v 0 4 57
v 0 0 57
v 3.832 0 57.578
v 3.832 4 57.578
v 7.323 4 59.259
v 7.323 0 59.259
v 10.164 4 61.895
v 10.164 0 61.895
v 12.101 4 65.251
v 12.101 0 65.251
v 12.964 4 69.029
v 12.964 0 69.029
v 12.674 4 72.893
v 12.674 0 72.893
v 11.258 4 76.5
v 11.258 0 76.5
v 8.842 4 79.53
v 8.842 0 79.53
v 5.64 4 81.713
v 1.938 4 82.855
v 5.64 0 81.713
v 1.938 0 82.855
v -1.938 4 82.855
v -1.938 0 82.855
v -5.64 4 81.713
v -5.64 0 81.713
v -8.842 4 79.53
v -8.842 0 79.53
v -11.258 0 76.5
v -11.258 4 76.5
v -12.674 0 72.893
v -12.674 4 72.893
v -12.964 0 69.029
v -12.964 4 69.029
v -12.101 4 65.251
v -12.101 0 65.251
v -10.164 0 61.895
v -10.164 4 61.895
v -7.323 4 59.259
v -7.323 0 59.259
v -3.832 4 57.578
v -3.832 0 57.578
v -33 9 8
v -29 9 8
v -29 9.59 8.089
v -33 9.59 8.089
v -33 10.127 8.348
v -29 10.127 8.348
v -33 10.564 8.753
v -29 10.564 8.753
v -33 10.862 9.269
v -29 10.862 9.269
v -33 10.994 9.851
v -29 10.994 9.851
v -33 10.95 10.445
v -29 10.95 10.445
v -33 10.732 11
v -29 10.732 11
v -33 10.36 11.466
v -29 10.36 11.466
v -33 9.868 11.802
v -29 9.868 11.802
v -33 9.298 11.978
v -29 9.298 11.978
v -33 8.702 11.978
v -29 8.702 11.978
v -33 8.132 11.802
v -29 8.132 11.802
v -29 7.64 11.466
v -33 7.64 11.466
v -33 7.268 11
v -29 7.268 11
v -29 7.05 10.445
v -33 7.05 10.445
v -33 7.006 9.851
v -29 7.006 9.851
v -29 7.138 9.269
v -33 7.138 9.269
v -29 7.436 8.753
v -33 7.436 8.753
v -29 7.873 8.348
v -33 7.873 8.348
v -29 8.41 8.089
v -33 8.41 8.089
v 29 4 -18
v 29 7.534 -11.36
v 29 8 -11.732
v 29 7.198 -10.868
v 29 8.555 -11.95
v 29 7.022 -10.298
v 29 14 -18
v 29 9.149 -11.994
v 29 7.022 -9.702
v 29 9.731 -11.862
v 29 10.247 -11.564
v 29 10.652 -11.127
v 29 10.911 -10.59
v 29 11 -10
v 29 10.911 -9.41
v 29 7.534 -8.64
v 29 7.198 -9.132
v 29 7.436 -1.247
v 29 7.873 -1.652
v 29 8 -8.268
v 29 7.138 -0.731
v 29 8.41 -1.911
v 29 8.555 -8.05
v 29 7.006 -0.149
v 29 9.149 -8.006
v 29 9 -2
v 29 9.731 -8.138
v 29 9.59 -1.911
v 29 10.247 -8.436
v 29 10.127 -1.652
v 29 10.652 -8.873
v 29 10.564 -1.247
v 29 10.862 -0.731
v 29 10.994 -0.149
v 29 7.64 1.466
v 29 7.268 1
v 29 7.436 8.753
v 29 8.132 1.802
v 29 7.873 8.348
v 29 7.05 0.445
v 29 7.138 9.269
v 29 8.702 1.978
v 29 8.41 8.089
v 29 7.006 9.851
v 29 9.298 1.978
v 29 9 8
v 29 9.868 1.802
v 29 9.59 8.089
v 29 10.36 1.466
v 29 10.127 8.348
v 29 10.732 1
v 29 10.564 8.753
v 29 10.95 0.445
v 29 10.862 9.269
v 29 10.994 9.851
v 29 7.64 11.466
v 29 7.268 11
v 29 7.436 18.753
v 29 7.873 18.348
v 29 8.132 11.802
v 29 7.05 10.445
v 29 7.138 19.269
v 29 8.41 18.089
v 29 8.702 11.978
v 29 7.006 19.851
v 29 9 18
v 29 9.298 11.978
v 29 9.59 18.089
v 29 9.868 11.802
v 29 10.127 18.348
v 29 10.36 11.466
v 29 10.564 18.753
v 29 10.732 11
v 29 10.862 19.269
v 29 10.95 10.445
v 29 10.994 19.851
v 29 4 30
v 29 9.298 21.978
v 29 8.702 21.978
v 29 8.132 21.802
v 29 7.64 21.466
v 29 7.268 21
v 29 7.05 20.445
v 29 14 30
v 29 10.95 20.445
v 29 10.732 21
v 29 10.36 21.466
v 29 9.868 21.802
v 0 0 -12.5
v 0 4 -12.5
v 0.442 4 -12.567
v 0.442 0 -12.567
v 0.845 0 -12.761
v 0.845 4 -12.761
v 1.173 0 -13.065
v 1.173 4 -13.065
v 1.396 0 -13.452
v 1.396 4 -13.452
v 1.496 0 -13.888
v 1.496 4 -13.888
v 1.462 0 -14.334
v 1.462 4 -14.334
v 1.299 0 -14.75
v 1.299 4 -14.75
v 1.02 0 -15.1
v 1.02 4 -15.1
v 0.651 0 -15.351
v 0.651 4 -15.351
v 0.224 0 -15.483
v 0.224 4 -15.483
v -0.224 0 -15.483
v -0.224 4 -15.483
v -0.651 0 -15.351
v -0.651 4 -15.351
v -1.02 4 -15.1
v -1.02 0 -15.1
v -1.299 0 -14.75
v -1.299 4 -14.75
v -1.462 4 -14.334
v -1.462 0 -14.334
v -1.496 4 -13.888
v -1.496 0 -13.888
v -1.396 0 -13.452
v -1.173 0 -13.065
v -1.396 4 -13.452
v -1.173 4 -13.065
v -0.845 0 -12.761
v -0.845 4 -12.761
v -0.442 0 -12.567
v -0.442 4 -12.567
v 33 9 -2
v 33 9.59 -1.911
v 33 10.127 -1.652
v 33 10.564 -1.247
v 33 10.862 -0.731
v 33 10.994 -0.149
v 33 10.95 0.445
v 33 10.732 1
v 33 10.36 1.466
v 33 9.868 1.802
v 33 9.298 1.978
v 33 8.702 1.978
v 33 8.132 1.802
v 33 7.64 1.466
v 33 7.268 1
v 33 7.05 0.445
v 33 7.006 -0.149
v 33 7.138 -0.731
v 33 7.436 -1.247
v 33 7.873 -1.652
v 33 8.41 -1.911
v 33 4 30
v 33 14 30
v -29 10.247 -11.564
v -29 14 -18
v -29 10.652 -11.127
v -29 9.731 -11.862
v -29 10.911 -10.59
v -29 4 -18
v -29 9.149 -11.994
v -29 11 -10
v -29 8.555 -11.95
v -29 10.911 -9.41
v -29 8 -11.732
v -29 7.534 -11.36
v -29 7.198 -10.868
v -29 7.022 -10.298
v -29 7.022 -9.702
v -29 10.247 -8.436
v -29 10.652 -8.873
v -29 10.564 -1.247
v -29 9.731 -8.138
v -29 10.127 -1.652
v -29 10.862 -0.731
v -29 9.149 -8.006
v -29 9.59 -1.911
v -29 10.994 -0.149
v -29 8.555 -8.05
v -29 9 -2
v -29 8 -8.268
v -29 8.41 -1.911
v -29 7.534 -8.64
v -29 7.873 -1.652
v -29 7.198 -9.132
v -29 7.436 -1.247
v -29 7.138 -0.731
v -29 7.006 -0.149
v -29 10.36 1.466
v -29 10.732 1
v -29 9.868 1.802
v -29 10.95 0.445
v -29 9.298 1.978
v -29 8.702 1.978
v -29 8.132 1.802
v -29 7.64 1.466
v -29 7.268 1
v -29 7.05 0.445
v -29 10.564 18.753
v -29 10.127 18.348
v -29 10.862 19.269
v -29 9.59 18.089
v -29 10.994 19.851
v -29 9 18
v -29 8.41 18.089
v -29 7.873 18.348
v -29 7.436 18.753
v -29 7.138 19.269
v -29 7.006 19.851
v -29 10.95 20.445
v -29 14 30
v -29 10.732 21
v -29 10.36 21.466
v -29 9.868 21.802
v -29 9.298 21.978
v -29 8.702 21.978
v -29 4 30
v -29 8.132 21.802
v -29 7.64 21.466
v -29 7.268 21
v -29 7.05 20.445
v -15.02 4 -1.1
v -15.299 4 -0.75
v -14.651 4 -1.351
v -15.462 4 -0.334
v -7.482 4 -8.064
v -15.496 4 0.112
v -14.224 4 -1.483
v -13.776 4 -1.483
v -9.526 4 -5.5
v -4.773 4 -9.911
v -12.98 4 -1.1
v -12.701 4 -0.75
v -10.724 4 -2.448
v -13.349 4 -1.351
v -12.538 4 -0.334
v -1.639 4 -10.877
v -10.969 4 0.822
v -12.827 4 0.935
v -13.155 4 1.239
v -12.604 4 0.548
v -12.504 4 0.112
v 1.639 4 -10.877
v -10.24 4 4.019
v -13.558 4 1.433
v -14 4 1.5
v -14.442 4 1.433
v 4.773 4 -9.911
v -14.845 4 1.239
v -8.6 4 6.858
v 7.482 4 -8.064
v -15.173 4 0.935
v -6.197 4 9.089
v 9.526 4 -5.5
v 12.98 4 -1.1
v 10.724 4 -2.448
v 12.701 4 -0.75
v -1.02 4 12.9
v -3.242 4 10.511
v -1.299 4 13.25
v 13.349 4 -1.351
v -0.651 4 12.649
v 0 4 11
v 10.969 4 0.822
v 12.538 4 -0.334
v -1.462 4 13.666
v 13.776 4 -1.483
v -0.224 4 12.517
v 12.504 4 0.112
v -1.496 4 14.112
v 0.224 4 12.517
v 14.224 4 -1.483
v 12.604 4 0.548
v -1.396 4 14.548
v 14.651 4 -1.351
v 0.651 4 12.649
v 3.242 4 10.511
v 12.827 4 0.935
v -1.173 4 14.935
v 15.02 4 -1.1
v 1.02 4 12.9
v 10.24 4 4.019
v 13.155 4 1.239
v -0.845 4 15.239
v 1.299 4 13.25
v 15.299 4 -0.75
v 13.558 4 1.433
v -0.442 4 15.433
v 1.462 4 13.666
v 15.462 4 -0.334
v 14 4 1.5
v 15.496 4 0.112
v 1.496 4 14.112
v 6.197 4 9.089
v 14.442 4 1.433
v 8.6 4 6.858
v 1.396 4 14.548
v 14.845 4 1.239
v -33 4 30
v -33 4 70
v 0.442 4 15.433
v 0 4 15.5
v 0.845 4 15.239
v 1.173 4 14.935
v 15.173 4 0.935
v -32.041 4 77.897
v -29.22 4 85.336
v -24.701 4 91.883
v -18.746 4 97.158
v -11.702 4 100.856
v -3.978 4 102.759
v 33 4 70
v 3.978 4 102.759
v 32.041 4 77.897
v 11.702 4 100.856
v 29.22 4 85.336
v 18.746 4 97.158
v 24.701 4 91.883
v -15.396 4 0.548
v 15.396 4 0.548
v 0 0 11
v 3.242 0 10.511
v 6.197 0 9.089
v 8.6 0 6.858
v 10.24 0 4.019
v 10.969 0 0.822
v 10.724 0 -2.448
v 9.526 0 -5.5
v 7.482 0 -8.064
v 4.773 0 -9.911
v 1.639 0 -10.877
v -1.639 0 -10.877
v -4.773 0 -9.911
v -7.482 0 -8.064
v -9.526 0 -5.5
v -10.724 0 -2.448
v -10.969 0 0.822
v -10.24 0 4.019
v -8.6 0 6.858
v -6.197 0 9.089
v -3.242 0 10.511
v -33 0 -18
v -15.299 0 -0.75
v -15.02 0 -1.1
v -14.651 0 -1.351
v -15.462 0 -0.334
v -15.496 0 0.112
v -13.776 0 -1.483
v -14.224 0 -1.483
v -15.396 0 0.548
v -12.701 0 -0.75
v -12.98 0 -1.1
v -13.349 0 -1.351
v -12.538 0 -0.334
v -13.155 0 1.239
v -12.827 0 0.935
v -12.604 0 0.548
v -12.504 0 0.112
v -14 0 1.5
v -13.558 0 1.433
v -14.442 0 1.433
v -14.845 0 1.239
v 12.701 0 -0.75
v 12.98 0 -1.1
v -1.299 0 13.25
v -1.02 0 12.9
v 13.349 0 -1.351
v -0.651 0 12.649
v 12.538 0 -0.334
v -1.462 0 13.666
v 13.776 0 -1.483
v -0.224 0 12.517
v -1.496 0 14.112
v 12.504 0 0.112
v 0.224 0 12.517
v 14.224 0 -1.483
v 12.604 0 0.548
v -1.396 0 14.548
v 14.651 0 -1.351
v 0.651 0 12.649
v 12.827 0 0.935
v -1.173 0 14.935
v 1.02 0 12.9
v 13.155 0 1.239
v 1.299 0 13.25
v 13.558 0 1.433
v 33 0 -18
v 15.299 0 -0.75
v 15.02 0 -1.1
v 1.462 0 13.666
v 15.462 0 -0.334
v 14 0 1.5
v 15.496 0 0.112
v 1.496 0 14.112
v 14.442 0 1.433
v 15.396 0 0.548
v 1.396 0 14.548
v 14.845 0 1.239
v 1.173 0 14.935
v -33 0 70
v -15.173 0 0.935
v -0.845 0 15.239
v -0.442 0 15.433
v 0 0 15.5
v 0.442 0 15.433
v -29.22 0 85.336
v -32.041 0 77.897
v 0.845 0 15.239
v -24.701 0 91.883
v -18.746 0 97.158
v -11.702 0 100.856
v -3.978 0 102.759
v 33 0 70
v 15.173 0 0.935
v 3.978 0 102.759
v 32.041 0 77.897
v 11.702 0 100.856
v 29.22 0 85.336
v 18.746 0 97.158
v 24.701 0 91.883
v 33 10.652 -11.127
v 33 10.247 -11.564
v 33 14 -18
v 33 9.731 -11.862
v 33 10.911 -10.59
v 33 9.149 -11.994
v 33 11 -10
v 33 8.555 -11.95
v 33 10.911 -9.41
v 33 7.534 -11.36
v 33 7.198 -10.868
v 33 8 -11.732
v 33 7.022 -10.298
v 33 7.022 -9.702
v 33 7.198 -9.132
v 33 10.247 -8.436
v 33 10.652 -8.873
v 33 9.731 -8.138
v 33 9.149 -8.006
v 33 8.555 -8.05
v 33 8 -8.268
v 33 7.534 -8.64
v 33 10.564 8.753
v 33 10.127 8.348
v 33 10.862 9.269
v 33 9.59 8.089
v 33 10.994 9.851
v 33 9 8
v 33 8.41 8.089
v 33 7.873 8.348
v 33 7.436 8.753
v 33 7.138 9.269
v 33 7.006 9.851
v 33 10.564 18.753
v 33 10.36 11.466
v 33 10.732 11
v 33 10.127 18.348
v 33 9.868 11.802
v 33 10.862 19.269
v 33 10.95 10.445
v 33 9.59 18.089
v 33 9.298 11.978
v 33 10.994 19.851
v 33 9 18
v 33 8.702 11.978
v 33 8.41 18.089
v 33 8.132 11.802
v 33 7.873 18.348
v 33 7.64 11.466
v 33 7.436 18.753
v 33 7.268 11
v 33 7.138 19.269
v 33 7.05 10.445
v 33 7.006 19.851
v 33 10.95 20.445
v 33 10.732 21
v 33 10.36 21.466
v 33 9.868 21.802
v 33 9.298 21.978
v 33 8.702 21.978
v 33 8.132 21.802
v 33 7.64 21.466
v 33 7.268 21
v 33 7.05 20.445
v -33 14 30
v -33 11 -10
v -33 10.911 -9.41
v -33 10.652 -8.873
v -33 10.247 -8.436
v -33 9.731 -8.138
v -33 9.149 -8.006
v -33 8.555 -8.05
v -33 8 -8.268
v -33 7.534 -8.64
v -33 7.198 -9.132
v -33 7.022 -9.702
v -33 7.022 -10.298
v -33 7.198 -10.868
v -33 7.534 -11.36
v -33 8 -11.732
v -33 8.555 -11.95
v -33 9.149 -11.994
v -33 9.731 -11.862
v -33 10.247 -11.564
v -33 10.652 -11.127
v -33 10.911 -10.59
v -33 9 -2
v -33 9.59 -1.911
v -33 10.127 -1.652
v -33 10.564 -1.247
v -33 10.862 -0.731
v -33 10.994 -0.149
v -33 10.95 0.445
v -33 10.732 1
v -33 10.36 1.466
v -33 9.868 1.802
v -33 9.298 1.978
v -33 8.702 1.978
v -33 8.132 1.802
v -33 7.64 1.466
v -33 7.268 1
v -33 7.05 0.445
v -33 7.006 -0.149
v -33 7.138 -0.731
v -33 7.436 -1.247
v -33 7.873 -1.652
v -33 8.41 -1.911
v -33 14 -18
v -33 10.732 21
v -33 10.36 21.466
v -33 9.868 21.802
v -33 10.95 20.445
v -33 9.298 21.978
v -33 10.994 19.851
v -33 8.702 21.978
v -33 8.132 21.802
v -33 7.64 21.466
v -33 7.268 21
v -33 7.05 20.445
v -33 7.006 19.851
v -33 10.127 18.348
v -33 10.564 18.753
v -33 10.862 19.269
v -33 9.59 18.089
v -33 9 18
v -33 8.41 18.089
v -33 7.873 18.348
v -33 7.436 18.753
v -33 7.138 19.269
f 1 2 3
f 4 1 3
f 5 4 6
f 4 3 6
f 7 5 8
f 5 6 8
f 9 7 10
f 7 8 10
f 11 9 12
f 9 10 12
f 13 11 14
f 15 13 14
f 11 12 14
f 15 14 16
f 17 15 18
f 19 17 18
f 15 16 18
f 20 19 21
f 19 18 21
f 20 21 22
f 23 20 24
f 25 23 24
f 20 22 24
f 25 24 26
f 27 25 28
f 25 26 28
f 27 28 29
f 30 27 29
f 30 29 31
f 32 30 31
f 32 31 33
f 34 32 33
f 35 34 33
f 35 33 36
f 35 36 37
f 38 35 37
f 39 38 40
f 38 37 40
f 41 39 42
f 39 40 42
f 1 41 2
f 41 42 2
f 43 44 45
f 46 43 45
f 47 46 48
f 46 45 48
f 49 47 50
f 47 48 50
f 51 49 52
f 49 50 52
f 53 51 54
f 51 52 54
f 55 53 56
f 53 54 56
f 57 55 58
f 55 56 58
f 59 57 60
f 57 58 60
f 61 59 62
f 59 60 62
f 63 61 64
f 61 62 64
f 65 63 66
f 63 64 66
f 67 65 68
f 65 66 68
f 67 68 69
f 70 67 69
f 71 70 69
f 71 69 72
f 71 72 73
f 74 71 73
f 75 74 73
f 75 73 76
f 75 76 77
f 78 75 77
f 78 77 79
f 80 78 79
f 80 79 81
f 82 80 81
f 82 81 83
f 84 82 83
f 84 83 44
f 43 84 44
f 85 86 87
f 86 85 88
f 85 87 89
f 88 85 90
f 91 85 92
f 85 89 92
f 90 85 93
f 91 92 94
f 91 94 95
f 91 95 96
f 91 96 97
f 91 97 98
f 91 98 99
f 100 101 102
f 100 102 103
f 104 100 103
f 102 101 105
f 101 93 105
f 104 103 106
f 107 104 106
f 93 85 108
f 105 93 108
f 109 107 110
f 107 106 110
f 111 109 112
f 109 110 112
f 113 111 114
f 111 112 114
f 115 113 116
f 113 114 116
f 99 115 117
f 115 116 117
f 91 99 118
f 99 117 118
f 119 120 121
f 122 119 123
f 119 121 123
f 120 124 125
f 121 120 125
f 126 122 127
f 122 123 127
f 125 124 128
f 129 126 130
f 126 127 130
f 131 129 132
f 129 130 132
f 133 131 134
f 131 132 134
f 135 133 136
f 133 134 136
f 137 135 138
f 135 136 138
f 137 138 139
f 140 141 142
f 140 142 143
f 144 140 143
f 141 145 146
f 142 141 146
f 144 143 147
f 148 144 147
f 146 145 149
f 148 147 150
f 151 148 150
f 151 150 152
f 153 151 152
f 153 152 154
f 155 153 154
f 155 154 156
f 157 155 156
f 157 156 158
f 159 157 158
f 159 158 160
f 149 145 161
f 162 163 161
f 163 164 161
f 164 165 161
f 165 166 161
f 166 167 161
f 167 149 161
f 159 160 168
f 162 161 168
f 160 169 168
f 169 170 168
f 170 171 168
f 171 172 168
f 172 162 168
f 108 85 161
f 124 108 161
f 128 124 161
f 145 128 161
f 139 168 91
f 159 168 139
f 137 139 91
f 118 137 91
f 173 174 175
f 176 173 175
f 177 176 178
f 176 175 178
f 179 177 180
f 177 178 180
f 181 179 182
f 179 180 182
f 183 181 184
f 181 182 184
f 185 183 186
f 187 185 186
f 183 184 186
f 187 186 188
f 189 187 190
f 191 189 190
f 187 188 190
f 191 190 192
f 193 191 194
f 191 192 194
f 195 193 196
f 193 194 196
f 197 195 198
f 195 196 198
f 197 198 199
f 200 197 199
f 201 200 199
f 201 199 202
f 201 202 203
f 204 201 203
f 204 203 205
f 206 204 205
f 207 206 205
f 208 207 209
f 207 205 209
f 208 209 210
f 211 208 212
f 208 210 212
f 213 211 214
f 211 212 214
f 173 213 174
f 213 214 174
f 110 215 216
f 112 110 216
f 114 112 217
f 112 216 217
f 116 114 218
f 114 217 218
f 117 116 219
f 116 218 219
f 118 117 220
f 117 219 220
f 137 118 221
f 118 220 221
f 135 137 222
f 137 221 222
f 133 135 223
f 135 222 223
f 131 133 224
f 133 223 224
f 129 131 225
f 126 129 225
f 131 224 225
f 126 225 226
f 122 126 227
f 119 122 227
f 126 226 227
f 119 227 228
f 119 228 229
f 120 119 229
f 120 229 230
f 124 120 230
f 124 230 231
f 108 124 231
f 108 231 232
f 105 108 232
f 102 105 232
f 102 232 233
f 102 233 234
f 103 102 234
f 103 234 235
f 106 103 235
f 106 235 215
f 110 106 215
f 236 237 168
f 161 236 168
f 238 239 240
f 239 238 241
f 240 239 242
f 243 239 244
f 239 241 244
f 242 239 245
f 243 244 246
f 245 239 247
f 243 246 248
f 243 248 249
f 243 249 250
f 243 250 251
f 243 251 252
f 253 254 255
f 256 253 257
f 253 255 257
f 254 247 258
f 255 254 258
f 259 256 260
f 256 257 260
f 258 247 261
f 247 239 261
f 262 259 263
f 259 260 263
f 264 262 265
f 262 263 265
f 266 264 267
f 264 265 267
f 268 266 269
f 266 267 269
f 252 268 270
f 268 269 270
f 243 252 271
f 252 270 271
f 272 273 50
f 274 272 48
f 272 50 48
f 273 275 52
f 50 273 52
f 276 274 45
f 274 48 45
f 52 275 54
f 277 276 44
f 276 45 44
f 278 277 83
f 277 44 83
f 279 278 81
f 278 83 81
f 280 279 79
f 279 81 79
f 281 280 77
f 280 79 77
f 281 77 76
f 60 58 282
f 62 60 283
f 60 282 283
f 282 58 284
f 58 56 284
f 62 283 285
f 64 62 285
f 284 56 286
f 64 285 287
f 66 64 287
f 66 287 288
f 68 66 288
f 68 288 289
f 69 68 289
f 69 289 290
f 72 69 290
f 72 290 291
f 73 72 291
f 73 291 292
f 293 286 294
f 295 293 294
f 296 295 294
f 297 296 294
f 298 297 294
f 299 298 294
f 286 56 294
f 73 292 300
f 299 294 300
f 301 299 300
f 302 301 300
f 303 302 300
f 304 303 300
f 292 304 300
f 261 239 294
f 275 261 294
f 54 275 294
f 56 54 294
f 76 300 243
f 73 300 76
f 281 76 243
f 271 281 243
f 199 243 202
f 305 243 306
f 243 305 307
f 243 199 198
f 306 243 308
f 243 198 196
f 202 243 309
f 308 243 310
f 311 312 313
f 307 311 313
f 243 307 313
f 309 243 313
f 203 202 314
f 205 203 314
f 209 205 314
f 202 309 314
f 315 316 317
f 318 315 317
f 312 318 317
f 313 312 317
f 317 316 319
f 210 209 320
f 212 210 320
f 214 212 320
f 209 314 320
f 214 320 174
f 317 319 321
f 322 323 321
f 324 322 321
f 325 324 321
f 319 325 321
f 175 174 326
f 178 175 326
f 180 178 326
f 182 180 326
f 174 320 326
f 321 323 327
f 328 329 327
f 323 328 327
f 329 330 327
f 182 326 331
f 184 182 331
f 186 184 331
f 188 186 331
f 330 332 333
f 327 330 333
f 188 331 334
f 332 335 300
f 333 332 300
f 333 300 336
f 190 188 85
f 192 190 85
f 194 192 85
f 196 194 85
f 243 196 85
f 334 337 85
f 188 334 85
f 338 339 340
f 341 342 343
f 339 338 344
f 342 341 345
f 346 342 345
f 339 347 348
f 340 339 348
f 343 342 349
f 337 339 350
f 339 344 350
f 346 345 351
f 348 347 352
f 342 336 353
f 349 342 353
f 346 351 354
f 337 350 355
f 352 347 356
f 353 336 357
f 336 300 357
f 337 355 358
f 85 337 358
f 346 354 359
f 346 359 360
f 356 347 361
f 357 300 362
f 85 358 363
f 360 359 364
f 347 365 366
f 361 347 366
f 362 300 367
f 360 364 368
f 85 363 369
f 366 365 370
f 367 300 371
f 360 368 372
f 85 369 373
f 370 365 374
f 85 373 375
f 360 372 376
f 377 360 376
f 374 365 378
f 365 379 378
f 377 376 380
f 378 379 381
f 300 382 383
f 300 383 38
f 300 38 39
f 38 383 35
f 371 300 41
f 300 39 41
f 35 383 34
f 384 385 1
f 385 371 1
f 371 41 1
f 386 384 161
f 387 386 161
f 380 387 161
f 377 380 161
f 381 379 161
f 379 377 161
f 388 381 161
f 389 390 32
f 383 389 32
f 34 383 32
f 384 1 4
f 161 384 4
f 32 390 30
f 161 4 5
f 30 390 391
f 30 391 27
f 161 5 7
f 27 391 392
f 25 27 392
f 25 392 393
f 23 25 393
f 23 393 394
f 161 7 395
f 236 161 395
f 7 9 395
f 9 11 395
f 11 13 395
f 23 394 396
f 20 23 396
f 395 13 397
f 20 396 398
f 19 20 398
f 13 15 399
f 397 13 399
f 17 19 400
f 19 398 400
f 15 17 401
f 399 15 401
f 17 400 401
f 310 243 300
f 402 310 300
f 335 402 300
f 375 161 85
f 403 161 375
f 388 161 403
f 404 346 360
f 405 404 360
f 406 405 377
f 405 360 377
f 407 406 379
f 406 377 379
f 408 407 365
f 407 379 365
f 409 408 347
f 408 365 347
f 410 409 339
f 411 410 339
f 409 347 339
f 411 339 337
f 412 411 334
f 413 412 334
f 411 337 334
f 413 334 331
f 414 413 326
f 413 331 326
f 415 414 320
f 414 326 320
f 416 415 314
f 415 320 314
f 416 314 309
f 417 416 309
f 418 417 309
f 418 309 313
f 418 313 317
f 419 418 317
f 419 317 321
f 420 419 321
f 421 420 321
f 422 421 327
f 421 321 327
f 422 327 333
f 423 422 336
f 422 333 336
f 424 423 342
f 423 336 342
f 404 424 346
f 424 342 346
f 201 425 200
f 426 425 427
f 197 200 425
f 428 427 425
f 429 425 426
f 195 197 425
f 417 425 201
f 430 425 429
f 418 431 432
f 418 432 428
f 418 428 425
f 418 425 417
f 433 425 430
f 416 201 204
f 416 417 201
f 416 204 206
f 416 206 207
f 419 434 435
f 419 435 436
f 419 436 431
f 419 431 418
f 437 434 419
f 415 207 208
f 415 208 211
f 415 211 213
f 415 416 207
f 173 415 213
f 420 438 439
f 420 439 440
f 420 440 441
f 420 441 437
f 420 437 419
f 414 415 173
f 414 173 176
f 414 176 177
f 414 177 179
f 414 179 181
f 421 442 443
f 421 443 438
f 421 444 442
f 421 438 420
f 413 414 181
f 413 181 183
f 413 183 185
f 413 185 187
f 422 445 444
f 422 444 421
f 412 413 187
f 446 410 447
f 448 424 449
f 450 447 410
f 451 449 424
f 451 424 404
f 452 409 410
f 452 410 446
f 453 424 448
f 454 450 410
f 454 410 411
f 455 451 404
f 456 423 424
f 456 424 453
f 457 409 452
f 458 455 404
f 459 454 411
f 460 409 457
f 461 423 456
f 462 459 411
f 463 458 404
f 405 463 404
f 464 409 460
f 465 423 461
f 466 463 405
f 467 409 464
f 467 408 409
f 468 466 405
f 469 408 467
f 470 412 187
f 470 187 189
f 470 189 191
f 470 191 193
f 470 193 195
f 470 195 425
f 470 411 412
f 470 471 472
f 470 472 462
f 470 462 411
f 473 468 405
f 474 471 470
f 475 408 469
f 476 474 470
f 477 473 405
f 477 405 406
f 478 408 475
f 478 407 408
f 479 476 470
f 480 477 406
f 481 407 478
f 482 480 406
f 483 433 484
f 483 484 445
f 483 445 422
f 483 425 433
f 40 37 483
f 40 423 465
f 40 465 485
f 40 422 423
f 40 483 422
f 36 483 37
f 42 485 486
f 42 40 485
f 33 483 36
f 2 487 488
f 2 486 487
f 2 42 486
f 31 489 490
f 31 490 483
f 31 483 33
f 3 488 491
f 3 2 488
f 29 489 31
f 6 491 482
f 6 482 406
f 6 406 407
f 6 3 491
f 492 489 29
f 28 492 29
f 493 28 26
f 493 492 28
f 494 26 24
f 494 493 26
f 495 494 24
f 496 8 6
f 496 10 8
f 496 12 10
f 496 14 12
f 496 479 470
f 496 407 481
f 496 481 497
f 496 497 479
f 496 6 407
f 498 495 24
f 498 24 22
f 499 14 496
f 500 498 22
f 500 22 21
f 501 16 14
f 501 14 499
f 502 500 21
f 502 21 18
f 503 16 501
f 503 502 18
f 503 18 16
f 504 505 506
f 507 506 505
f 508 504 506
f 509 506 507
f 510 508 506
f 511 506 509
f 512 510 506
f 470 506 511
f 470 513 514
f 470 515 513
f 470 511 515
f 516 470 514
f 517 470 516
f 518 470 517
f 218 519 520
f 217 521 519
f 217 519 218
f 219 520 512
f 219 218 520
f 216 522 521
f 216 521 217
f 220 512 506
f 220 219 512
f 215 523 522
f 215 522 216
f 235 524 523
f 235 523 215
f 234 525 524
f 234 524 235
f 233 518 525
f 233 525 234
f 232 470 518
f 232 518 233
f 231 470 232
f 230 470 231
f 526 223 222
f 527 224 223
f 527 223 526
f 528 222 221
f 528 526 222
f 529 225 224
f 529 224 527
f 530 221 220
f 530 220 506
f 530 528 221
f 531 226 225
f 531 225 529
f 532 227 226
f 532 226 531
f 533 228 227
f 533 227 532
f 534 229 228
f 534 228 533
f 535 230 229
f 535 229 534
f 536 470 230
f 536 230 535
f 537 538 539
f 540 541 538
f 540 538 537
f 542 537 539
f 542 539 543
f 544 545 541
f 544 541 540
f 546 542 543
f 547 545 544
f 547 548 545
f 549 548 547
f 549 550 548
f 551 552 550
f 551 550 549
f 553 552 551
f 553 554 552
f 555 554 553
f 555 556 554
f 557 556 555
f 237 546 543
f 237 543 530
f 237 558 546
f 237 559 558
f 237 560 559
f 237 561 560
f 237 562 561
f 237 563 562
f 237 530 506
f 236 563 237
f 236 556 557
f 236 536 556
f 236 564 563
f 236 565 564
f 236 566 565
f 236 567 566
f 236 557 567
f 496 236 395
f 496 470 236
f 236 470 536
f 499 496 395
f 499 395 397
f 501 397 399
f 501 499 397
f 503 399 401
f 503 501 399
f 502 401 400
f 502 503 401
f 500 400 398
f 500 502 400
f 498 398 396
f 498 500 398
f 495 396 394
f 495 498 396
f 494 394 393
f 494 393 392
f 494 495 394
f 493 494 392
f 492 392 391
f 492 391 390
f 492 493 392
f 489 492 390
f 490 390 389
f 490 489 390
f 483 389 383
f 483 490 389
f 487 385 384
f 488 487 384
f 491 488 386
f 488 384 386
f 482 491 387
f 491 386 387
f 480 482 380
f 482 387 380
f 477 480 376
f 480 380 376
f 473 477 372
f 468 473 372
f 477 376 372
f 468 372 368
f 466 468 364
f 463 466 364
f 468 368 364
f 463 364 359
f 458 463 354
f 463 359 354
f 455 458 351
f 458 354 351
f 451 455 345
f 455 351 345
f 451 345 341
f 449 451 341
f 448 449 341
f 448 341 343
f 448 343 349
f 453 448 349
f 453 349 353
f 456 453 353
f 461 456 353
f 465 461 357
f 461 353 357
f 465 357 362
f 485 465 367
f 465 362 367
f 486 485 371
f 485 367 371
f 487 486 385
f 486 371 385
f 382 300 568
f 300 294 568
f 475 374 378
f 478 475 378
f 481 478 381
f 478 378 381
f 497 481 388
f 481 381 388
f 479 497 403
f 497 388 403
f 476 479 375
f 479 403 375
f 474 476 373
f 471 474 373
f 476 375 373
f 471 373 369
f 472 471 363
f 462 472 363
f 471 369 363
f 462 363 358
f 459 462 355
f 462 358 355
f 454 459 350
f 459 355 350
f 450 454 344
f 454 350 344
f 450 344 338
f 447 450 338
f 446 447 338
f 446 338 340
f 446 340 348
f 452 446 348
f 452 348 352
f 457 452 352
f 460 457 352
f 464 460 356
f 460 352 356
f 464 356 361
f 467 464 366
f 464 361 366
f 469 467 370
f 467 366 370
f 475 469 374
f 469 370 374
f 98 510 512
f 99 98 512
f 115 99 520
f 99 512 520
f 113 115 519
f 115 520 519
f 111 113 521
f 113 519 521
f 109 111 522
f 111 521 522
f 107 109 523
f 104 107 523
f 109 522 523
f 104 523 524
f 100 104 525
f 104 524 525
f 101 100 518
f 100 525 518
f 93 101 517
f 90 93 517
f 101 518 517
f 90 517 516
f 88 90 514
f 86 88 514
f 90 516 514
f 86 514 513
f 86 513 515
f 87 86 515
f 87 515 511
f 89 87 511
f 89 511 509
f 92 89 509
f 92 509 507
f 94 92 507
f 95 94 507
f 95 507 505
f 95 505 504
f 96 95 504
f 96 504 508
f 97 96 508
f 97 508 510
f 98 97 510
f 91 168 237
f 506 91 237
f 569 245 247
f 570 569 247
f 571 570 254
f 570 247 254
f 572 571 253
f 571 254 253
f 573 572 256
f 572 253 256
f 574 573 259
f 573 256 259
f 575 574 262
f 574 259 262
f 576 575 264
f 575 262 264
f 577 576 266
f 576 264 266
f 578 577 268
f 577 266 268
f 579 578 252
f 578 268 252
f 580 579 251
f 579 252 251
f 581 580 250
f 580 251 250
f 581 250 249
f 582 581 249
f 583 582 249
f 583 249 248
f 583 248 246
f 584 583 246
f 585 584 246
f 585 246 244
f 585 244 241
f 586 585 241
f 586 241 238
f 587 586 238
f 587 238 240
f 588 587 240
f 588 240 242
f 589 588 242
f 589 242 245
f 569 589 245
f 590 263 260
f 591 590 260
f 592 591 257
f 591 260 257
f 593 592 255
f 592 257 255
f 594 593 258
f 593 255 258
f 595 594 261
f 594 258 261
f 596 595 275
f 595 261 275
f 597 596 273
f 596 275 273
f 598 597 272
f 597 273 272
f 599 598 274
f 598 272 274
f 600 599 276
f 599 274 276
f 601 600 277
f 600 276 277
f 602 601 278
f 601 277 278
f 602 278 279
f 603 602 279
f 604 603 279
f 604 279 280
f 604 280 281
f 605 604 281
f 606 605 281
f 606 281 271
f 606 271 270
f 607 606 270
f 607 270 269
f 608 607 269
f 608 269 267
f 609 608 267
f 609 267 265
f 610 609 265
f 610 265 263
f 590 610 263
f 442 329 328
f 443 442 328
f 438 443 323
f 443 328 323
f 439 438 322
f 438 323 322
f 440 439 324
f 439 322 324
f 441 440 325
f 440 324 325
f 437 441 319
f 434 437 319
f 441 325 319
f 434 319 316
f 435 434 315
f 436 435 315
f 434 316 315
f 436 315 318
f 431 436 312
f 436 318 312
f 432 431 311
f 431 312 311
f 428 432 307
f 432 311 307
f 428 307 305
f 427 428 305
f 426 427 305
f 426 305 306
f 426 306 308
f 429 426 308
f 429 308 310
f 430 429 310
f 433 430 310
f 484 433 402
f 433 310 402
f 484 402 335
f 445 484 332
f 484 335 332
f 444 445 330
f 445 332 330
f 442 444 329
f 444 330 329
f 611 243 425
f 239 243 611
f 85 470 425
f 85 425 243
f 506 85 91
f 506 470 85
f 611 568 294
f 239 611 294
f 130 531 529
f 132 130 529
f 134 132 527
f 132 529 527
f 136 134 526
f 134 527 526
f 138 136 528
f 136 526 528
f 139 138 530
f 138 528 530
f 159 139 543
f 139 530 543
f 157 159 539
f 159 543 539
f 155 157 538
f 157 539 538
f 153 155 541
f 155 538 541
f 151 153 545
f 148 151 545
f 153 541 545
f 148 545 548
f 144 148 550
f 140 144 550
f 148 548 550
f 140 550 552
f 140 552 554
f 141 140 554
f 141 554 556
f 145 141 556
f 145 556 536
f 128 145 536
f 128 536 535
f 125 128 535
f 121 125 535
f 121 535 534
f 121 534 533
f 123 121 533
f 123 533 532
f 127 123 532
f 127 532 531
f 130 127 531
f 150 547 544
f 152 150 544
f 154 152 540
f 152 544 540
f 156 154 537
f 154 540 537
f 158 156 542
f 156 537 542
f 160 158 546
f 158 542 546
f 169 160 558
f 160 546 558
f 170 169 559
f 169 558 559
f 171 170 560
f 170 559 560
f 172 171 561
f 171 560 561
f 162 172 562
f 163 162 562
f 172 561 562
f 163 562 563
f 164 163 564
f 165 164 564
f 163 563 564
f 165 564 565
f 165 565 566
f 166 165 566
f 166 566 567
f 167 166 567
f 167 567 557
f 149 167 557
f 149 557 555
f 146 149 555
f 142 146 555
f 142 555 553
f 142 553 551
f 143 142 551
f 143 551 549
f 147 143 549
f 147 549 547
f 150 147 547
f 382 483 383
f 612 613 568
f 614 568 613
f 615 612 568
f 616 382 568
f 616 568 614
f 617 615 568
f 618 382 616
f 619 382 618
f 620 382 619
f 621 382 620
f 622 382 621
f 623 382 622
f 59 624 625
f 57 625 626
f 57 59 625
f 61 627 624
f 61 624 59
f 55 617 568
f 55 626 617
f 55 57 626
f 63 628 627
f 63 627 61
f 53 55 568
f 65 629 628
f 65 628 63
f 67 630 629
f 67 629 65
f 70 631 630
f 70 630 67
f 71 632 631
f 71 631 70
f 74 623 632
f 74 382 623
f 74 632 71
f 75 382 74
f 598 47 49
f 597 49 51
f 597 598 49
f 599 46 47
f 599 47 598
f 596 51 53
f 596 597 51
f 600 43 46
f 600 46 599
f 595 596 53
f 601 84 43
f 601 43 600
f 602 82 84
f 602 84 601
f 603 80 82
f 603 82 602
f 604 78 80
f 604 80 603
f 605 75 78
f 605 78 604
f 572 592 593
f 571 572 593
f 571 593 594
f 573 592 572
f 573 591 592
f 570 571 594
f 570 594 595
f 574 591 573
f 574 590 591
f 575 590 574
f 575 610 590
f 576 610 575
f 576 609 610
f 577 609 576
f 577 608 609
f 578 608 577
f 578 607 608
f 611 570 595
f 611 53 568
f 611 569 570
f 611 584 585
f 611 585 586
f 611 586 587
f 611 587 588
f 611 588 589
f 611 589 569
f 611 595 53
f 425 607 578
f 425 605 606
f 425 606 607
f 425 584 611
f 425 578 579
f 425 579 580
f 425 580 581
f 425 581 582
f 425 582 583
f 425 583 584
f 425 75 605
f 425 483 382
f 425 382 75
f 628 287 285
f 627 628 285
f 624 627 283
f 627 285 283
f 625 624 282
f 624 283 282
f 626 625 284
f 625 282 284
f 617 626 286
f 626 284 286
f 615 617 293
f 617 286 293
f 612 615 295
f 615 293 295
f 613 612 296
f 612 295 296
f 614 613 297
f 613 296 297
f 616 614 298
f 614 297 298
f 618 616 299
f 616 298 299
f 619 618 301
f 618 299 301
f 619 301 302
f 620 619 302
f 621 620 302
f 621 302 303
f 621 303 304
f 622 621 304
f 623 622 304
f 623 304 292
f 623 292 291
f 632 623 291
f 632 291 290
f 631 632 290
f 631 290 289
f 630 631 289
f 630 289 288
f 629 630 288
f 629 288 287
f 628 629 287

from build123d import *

# Parameters (mm, degrees)
EXTRUDE_1_DEPTH     = 30
CUT_EXTRUDE_1_REACH = 75.838
SKETCH_2_R          = 2
SKETCH_3_R          = 11
SKETCH_3_R_2        = 1.5
CUT_EXTRUDE_2_DEPTH = 4
SKETCH_4_R          = 13
EXTRUDE_2_DEPTH     = 4
CUT_EXTRUDE_3_REACH = 125.13
SKETCH_5_W          = 12
SKETCH_5_H          = 14


with BuildPart() as part:
    # 草图1 → 凸台-拉伸1 (new, symmetric)
    with BuildSketch(Plane.XY):
        Polygon((33, 0), (-33, 0), (-33, 14), (-29, 14), (-29, 4), (29, 4), (29, 14), (33, 14), align=None)
    extrude(amount=EXTRUDE_1_DEPTH, both=True)

    # 切除-拉伸1: up to this face of the body (flat: up to its plane)
    cut_extrude_1_end = Plane(part.part.faces().sort_by_distance((-33, 7, 0))[0])
    # 草图2 → 切除-拉伸1 (cut, up to the picked face)
    with BuildSketch(Plane(origin=(33, 0, 0), x_dir=(0, 0, -1), z_dir=(1, 0, 0)), mode=Mode.PRIVATE) as cut_extrude_1_sk1:
        with Locations((-20, 9)):
            Circle(SKETCH_2_R)
    cut_extrude_1_tool1 = split(extrude(cut_extrude_1_sk1.sketch, amount=-CUT_EXTRUDE_1_REACH, mode=Mode.PRIVATE), bisect_by=cut_extrude_1_end, keep=Keep.BOTH, mode=Mode.PRIVATE)
    # 草图2 → 切除-拉伸1 (cut, up to the picked face)
    with BuildSketch(Plane(origin=(33, 0, 0), x_dir=(0, 0, -1), z_dir=(1, 0, 0)), mode=Mode.PRIVATE) as cut_extrude_1_sk2:
        with Locations((-10, 9)):
            Circle(SKETCH_2_R)
    cut_extrude_1_tool2 = split(extrude(cut_extrude_1_sk2.sketch, amount=-CUT_EXTRUDE_1_REACH, mode=Mode.PRIVATE), bisect_by=cut_extrude_1_end, keep=Keep.BOTH, mode=Mode.PRIVATE)
    # 草图2 → 切除-拉伸1 (cut, up to the picked face)
    with BuildSketch(Plane(origin=(33, 0, 0), x_dir=(0, 0, -1), z_dir=(1, 0, 0)), mode=Mode.PRIVATE) as cut_extrude_1_sk3:
        with Locations(Location((10, 9, 0), (0, 0, 90))):
            Circle(SKETCH_2_R)
    cut_extrude_1_tool3 = split(extrude(cut_extrude_1_sk3.sketch, amount=-CUT_EXTRUDE_1_REACH, mode=Mode.PRIVATE), bisect_by=cut_extrude_1_end, keep=Keep.BOTH, mode=Mode.PRIVATE)
    # 草图2 → 切除-拉伸1 (cut, up to the picked face)
    with BuildSketch(Plane(origin=(33, 0, 0), x_dir=(0, 0, -1), z_dir=(1, 0, 0)), mode=Mode.PRIVATE) as cut_extrude_1_sk4:
        with Locations((0, 9)):
            Circle(SKETCH_2_R)
    cut_extrude_1_tool4 = split(extrude(cut_extrude_1_sk4.sketch, amount=-CUT_EXTRUDE_1_REACH, mode=Mode.PRIVATE), bisect_by=cut_extrude_1_end, keep=Keep.BOTH, mode=Mode.PRIVATE)
    add(cut_extrude_1_tool1.solids().sort_by(Axis((33, 9, 20), (-1, 0, 0)))[0], mode=Mode.SUBTRACT)
    add(cut_extrude_1_tool2.solids().sort_by(Axis((33, 9, 10), (-1, 0, 0)))[0], mode=Mode.SUBTRACT)
    add(cut_extrude_1_tool3.solids().sort_by(Axis((33, 9, -10), (-1, 0, 0)))[0], mode=Mode.SUBTRACT)
    add(cut_extrude_1_tool4.solids().sort_by(Axis((33, 9, 0), (-1, 0, 0)))[0], mode=Mode.SUBTRACT)

    # 草图3 → 切除-拉伸2 (cut)
    with BuildSketch(Plane(origin=(0, 4, 0), x_dir=(1, 0, 0), z_dir=(0, 1, 0))):
        with Locations(Location((0, 0, 0), (0, 0, 270))):
            Circle(SKETCH_3_R)
        with Locations(Location((0, 14, 0), (0, 0, 270))):
            Circle(SKETCH_3_R_2)
        with Locations(Location((14, 0, 0), (0, 0, 270))):
            Circle(SKETCH_3_R_2)
        with Locations(Location((0, -14, 0), (0, 0, 270))):
            Circle(SKETCH_3_R_2)
        with Locations(Location((-14, 0, 0), (0, 0, 270))):
            Circle(SKETCH_3_R_2)
    extrude(amount=-CUT_EXTRUDE_2_DEPTH, mode=Mode.SUBTRACT)

    # 草图4 → 凸台-拉伸2 (add)
    with BuildSketch(Plane.XZ):
        with BuildLine():
            Line((-33, 30), (33, 30))
            Line((33, 30), (33, 70))
            ThreePointArc((33, 70), (0, 103), (-33, 70))
            Line((-33, 70), (-33, 30))
        make_face()
        with Locations(Location((0, 70, 0), (0, 0, 270))):
            Circle(SKETCH_4_R, mode=Mode.SUBTRACT)
    extrude(amount=-EXTRUDE_2_DEPTH)

    # 切除-拉伸3: up to this face of the body (flat: up to its plane)
    cut_extrude_3_end = Plane(part.part.faces().sort_by_distance((-33, 6.051807691, 8.158777474))[0])
    # 草图5 → 切除-拉伸3 (cut, up to the picked face)
    with BuildSketch(Plane(origin=(33, 0, 0), x_dir=(0, 0, -1), z_dir=(1, 0, 0)), mode=Mode.PRIVATE) as cut_extrude_3_sk1:
        with Locations((24, 7)):
            Rectangle(SKETCH_5_W, SKETCH_5_H)
    cut_extrude_3_tool1 = split(extrude(cut_extrude_3_sk1.sketch, amount=-CUT_EXTRUDE_3_REACH, mode=Mode.PRIVATE), bisect_by=cut_extrude_3_end, keep=Keep.BOTH, mode=Mode.PRIVATE)
    add(cut_extrude_3_tool1.solids().sort_by(Axis((33, 7, -24), (-1, 0, 0)))[0], mode=Mode.SUBTRACT)


solid = part.part
